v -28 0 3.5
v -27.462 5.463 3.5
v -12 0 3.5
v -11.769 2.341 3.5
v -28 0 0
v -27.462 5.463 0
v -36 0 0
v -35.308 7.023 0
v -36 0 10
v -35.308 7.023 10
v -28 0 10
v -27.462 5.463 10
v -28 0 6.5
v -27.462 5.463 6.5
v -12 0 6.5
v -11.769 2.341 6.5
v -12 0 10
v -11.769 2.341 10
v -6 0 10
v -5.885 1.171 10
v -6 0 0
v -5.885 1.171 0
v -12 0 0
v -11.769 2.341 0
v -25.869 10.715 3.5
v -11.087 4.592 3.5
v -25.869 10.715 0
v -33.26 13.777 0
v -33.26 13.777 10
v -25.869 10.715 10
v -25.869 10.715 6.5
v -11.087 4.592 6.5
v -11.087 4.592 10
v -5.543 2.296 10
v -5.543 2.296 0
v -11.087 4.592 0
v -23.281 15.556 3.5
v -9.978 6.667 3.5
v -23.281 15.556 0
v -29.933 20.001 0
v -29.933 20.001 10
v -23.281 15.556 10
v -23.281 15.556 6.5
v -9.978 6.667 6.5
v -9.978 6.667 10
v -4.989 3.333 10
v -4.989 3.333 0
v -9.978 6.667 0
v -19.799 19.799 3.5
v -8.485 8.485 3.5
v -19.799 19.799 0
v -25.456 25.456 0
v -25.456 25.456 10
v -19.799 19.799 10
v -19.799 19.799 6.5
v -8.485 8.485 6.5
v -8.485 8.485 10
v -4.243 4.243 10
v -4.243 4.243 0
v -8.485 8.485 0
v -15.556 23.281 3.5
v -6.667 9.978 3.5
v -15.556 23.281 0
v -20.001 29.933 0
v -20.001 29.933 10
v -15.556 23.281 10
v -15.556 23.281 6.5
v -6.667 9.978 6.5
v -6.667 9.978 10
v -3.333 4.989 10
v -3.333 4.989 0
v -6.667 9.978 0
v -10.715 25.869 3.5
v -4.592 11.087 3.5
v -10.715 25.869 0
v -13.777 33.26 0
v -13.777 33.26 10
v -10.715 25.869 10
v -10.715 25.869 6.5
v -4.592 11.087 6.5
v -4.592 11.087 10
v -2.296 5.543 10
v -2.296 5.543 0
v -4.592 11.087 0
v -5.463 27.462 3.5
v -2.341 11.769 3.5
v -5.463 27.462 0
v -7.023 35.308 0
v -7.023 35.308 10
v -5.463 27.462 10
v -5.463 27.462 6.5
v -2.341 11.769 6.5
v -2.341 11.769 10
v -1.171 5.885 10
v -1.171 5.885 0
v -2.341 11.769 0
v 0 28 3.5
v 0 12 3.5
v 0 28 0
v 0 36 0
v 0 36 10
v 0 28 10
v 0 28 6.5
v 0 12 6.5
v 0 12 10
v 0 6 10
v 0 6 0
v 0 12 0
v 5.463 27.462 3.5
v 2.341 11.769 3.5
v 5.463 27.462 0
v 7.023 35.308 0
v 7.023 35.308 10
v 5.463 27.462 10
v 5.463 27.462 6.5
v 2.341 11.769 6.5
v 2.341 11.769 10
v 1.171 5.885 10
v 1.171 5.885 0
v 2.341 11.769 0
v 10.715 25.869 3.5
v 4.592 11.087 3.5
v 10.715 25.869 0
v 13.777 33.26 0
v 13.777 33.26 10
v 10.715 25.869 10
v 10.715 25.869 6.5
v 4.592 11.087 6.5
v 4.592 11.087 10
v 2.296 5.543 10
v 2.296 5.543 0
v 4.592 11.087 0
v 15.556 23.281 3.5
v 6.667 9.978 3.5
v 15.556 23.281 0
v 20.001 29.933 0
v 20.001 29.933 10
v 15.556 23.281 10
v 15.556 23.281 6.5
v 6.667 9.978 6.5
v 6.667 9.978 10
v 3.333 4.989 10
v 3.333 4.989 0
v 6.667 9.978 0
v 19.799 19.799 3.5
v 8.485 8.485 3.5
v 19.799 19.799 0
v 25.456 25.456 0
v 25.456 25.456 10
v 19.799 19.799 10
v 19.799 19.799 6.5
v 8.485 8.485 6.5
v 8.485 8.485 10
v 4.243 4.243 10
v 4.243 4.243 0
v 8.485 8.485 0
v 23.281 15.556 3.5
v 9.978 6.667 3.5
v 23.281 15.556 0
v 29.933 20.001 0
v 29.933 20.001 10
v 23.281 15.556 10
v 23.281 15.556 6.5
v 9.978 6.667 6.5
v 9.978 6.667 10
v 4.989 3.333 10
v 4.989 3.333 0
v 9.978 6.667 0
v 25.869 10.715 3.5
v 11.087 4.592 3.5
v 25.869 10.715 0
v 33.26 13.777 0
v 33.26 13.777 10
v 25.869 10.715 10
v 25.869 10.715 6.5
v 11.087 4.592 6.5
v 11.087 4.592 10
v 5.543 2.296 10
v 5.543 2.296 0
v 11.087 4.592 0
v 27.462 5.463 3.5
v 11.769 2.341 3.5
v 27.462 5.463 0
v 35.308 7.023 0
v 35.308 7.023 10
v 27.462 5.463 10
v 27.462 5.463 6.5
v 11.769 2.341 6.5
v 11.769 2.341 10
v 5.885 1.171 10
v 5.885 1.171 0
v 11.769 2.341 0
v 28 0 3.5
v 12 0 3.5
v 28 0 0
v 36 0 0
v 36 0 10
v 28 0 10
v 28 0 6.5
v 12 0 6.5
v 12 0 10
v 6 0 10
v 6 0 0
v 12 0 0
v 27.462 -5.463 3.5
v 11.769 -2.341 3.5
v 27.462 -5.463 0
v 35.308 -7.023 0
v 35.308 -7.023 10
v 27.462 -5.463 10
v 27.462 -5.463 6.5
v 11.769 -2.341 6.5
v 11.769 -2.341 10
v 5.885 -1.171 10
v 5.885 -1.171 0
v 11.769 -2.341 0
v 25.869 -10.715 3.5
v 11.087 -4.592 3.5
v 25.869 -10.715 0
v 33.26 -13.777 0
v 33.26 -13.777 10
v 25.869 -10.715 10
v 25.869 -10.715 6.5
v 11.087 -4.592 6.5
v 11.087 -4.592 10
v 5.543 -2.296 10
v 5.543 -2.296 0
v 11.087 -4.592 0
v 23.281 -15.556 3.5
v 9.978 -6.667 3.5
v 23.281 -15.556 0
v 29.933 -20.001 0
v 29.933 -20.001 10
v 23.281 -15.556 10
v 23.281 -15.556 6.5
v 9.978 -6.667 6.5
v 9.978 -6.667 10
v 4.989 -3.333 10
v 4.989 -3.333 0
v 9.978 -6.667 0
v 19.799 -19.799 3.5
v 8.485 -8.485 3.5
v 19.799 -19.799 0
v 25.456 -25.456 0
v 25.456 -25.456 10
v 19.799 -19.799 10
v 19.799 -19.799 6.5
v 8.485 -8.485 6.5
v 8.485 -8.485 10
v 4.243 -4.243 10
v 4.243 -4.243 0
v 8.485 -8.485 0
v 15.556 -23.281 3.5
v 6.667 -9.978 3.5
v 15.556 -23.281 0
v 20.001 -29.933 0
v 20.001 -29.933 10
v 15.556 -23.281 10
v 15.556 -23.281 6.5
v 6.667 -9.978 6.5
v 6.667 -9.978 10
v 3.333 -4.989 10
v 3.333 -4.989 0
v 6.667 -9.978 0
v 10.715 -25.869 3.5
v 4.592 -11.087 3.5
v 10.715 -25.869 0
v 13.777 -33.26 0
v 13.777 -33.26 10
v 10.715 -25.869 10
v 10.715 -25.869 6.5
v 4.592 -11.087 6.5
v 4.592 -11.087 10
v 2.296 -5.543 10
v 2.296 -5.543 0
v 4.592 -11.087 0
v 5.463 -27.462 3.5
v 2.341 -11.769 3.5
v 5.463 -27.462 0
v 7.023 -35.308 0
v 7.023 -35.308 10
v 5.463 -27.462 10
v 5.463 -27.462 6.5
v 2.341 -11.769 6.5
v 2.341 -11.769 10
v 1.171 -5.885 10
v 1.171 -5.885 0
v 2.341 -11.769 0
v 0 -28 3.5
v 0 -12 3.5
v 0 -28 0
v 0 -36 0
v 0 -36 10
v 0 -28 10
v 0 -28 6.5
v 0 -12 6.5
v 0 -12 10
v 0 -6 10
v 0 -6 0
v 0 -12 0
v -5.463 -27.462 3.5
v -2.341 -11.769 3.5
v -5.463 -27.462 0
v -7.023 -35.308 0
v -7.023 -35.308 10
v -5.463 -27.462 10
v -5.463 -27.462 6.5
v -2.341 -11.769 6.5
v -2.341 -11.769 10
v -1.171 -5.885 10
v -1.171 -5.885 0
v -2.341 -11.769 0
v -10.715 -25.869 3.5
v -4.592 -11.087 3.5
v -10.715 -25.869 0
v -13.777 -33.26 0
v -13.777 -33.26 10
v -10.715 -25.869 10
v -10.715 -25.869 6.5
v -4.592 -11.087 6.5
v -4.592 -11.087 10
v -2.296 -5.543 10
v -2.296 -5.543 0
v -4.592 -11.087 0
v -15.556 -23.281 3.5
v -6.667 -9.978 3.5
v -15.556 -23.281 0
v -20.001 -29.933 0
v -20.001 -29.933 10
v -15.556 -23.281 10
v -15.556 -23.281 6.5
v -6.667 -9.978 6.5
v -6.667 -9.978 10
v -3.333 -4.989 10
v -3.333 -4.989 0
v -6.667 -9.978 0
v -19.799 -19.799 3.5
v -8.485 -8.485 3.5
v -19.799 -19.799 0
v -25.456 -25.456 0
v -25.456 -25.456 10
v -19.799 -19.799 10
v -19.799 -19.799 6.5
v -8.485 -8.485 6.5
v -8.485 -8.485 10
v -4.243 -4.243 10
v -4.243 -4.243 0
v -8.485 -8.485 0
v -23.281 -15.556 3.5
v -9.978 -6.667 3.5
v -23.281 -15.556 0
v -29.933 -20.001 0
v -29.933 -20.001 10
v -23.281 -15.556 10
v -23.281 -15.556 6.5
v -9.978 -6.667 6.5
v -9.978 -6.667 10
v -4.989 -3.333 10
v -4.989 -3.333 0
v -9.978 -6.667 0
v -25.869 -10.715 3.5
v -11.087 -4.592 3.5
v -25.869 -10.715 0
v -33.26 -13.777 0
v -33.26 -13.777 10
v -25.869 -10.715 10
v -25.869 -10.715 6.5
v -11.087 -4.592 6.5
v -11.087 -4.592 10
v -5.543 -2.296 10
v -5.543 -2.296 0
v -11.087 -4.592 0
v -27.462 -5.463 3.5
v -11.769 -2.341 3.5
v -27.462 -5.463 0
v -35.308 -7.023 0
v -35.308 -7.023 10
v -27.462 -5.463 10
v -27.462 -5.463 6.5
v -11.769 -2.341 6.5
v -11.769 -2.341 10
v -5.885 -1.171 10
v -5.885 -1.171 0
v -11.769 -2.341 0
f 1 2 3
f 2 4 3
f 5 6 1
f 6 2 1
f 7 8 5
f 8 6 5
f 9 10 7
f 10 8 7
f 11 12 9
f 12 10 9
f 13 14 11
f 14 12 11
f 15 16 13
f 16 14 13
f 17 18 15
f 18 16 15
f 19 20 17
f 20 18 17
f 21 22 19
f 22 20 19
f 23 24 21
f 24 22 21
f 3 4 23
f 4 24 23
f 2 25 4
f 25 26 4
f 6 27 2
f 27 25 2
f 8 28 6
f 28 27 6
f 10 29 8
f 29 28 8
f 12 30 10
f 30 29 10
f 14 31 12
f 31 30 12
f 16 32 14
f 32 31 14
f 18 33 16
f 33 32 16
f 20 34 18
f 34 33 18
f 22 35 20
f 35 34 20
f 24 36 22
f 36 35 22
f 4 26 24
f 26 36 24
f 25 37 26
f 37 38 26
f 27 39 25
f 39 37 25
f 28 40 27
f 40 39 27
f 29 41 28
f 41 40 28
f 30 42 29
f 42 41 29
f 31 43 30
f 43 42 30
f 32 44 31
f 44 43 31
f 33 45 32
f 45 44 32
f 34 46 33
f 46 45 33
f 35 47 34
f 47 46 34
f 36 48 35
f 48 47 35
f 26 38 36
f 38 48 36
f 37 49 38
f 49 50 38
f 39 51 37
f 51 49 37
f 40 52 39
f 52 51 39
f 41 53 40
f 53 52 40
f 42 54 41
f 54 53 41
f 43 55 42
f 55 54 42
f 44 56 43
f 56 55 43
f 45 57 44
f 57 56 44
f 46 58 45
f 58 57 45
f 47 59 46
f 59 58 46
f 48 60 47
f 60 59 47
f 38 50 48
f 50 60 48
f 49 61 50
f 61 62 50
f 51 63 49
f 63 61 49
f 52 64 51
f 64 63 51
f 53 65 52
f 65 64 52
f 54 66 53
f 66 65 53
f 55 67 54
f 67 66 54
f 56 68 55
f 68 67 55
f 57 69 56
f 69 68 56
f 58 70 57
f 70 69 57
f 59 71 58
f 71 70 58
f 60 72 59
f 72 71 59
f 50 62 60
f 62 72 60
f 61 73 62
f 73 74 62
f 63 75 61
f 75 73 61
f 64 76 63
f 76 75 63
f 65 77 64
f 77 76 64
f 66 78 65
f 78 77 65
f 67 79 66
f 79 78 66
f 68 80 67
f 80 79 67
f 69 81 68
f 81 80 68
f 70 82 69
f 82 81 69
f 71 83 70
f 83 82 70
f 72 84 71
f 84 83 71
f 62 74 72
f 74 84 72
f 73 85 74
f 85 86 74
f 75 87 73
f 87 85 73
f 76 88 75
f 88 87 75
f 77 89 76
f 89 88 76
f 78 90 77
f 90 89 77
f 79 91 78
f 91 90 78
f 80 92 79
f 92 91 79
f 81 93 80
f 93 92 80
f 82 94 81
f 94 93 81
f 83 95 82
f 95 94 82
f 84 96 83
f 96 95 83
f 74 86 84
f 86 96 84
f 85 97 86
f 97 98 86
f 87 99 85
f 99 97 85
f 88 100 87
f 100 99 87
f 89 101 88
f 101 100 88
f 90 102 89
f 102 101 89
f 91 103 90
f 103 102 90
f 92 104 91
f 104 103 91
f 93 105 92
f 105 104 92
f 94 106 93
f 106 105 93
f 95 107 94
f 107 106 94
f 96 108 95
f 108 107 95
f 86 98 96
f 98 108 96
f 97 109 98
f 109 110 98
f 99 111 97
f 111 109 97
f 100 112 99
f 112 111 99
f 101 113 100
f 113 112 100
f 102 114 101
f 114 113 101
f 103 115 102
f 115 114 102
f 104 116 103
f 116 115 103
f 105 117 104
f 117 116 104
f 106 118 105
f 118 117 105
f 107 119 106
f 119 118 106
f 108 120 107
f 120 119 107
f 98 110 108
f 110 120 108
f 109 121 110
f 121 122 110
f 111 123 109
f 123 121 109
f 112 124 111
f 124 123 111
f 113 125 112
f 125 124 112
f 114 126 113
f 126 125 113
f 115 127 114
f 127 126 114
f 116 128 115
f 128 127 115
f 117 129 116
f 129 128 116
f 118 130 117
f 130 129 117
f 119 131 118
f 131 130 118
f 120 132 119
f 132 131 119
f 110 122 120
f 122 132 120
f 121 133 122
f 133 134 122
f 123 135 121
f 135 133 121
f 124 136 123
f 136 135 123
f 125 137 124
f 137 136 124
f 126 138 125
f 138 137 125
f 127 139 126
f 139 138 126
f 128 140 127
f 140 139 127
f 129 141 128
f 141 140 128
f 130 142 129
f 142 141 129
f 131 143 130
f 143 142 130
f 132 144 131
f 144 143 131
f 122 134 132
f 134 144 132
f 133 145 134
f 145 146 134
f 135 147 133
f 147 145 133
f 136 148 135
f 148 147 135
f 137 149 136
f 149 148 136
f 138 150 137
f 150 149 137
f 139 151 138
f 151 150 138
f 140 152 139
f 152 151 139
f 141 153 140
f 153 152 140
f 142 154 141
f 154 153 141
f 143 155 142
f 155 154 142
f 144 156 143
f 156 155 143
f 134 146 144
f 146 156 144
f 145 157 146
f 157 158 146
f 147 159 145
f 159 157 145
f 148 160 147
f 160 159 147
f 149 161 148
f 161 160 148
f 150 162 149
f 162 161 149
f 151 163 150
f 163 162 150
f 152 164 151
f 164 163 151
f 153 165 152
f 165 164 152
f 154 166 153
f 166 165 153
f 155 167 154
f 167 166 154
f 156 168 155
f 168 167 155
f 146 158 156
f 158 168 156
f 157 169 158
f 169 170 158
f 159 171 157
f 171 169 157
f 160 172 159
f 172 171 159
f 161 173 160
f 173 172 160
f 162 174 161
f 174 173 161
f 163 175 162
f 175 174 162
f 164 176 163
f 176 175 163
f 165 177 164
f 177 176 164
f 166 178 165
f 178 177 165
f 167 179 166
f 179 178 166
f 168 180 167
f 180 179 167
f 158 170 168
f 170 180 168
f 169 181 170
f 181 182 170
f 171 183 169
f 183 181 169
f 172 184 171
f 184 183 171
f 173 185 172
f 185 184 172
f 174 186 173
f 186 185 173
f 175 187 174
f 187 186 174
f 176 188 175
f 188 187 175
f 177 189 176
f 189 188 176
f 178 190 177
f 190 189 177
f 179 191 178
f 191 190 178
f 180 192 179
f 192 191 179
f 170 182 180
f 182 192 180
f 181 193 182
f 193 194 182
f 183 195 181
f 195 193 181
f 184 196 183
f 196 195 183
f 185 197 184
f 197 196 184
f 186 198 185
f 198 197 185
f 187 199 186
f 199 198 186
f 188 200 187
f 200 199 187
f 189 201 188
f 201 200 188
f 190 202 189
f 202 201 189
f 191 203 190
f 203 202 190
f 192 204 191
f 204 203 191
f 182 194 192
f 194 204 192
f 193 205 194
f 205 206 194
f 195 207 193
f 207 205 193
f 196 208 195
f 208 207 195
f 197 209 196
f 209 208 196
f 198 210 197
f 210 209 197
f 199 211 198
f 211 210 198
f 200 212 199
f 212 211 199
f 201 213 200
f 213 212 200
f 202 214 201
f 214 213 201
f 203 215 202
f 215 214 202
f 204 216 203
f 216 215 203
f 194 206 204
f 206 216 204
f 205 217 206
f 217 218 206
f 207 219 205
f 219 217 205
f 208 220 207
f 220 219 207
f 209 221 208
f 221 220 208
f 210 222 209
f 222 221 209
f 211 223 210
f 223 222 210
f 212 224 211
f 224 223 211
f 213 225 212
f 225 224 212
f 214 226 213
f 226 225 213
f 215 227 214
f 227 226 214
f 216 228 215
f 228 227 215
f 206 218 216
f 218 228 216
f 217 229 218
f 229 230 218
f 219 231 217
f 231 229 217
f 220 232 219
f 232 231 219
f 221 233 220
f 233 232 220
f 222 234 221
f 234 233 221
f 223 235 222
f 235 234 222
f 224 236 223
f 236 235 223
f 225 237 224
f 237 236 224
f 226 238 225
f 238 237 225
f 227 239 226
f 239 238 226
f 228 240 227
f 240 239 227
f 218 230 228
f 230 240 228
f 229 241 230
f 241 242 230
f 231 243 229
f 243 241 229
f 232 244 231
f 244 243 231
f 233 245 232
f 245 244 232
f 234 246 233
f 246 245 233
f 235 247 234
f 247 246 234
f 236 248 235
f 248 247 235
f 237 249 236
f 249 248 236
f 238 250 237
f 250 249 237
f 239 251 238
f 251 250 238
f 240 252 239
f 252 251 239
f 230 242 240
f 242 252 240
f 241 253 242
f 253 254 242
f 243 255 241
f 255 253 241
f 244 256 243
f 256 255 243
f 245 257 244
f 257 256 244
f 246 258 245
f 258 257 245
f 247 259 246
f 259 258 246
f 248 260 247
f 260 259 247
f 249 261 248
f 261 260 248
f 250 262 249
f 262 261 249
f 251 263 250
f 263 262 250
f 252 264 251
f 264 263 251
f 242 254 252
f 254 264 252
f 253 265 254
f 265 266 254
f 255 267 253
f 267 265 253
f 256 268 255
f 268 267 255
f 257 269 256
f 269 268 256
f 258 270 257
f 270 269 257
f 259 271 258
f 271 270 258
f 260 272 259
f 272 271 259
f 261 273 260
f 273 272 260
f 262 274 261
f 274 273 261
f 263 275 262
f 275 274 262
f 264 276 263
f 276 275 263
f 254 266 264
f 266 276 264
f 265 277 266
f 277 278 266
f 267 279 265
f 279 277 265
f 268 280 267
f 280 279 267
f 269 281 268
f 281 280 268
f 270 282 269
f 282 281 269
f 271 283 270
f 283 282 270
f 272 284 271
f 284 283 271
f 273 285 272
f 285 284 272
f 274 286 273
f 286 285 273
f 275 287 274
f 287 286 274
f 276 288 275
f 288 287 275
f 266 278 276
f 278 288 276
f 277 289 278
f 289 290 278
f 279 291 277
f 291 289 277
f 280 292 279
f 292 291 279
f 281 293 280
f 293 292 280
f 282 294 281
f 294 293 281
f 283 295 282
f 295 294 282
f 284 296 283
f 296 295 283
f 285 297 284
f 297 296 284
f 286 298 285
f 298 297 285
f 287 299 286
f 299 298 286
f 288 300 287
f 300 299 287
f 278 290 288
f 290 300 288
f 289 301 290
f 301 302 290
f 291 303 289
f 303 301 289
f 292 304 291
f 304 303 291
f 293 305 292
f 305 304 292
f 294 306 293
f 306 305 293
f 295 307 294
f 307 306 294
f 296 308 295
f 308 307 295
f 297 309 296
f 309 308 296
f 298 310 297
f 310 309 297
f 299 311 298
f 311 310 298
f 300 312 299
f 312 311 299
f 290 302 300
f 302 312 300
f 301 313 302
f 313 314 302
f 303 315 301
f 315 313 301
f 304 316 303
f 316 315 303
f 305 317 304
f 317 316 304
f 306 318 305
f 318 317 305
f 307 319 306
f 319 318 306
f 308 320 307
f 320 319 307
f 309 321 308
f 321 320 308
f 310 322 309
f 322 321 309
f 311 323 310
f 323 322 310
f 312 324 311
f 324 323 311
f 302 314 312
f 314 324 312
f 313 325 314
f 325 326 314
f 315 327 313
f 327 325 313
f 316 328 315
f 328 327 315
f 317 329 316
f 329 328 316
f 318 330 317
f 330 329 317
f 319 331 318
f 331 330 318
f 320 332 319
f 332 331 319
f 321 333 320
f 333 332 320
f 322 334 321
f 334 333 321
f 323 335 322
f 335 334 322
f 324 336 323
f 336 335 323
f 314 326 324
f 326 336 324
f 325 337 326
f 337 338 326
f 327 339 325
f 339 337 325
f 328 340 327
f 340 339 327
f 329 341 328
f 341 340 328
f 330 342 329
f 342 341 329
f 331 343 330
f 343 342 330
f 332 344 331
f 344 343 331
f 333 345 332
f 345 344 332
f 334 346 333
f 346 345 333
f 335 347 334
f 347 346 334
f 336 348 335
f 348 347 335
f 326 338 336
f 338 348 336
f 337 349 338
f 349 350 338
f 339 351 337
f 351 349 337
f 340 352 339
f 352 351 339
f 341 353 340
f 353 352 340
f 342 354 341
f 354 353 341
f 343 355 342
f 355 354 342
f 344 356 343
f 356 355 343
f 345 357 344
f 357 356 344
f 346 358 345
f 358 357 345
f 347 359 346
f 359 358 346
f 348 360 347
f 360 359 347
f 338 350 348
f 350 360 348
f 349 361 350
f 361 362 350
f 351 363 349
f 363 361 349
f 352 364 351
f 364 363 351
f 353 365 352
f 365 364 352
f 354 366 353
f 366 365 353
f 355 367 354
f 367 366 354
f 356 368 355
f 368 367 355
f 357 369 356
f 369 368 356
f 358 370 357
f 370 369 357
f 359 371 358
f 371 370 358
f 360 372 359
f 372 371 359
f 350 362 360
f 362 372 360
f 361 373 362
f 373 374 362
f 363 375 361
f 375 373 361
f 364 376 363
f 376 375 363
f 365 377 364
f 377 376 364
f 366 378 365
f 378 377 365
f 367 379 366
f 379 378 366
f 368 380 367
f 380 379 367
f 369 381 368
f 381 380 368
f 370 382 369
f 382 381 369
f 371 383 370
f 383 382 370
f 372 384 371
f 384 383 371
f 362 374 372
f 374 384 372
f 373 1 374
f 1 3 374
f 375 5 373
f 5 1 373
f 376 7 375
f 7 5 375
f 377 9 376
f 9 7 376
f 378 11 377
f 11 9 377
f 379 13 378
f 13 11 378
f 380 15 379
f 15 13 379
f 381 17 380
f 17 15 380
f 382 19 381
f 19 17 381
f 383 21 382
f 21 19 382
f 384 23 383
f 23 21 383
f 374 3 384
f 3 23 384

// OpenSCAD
$fn = 32;

// ----------------------------------------------------------------------
// Revolved part: handwheel R36
// ----------------------------------------------------------------------

// --- parameters (mm) ---
bore_r = 6;               // bore radius
rim_r = 36;               // rim radius
rim_w = 8;                // rim axial width
rim_t = 10;               // rim diameter height
hub_r = 12;               // hub radius
web_t = 3;                // web thickness
revolve_angle = 360;      // revolve sweep, degrees

bore_d = 2 * bore_r;
rim_d = 2 * rim_r;
hub_d = 2 * hub_r;

profile = [[6, 0], [12, 0], [12, 3.5], [28, 3.5], [28, 0], [36, 0], [36, 10], [28, 10], [28, 6.5], [12, 6.5], [12, 10], [6, 10]];  // primary outline, 12 points, counter clockwise

// --- the one profile operation ---
rotate_extrude(angle = revolve_angle) polygon(points = profile);
